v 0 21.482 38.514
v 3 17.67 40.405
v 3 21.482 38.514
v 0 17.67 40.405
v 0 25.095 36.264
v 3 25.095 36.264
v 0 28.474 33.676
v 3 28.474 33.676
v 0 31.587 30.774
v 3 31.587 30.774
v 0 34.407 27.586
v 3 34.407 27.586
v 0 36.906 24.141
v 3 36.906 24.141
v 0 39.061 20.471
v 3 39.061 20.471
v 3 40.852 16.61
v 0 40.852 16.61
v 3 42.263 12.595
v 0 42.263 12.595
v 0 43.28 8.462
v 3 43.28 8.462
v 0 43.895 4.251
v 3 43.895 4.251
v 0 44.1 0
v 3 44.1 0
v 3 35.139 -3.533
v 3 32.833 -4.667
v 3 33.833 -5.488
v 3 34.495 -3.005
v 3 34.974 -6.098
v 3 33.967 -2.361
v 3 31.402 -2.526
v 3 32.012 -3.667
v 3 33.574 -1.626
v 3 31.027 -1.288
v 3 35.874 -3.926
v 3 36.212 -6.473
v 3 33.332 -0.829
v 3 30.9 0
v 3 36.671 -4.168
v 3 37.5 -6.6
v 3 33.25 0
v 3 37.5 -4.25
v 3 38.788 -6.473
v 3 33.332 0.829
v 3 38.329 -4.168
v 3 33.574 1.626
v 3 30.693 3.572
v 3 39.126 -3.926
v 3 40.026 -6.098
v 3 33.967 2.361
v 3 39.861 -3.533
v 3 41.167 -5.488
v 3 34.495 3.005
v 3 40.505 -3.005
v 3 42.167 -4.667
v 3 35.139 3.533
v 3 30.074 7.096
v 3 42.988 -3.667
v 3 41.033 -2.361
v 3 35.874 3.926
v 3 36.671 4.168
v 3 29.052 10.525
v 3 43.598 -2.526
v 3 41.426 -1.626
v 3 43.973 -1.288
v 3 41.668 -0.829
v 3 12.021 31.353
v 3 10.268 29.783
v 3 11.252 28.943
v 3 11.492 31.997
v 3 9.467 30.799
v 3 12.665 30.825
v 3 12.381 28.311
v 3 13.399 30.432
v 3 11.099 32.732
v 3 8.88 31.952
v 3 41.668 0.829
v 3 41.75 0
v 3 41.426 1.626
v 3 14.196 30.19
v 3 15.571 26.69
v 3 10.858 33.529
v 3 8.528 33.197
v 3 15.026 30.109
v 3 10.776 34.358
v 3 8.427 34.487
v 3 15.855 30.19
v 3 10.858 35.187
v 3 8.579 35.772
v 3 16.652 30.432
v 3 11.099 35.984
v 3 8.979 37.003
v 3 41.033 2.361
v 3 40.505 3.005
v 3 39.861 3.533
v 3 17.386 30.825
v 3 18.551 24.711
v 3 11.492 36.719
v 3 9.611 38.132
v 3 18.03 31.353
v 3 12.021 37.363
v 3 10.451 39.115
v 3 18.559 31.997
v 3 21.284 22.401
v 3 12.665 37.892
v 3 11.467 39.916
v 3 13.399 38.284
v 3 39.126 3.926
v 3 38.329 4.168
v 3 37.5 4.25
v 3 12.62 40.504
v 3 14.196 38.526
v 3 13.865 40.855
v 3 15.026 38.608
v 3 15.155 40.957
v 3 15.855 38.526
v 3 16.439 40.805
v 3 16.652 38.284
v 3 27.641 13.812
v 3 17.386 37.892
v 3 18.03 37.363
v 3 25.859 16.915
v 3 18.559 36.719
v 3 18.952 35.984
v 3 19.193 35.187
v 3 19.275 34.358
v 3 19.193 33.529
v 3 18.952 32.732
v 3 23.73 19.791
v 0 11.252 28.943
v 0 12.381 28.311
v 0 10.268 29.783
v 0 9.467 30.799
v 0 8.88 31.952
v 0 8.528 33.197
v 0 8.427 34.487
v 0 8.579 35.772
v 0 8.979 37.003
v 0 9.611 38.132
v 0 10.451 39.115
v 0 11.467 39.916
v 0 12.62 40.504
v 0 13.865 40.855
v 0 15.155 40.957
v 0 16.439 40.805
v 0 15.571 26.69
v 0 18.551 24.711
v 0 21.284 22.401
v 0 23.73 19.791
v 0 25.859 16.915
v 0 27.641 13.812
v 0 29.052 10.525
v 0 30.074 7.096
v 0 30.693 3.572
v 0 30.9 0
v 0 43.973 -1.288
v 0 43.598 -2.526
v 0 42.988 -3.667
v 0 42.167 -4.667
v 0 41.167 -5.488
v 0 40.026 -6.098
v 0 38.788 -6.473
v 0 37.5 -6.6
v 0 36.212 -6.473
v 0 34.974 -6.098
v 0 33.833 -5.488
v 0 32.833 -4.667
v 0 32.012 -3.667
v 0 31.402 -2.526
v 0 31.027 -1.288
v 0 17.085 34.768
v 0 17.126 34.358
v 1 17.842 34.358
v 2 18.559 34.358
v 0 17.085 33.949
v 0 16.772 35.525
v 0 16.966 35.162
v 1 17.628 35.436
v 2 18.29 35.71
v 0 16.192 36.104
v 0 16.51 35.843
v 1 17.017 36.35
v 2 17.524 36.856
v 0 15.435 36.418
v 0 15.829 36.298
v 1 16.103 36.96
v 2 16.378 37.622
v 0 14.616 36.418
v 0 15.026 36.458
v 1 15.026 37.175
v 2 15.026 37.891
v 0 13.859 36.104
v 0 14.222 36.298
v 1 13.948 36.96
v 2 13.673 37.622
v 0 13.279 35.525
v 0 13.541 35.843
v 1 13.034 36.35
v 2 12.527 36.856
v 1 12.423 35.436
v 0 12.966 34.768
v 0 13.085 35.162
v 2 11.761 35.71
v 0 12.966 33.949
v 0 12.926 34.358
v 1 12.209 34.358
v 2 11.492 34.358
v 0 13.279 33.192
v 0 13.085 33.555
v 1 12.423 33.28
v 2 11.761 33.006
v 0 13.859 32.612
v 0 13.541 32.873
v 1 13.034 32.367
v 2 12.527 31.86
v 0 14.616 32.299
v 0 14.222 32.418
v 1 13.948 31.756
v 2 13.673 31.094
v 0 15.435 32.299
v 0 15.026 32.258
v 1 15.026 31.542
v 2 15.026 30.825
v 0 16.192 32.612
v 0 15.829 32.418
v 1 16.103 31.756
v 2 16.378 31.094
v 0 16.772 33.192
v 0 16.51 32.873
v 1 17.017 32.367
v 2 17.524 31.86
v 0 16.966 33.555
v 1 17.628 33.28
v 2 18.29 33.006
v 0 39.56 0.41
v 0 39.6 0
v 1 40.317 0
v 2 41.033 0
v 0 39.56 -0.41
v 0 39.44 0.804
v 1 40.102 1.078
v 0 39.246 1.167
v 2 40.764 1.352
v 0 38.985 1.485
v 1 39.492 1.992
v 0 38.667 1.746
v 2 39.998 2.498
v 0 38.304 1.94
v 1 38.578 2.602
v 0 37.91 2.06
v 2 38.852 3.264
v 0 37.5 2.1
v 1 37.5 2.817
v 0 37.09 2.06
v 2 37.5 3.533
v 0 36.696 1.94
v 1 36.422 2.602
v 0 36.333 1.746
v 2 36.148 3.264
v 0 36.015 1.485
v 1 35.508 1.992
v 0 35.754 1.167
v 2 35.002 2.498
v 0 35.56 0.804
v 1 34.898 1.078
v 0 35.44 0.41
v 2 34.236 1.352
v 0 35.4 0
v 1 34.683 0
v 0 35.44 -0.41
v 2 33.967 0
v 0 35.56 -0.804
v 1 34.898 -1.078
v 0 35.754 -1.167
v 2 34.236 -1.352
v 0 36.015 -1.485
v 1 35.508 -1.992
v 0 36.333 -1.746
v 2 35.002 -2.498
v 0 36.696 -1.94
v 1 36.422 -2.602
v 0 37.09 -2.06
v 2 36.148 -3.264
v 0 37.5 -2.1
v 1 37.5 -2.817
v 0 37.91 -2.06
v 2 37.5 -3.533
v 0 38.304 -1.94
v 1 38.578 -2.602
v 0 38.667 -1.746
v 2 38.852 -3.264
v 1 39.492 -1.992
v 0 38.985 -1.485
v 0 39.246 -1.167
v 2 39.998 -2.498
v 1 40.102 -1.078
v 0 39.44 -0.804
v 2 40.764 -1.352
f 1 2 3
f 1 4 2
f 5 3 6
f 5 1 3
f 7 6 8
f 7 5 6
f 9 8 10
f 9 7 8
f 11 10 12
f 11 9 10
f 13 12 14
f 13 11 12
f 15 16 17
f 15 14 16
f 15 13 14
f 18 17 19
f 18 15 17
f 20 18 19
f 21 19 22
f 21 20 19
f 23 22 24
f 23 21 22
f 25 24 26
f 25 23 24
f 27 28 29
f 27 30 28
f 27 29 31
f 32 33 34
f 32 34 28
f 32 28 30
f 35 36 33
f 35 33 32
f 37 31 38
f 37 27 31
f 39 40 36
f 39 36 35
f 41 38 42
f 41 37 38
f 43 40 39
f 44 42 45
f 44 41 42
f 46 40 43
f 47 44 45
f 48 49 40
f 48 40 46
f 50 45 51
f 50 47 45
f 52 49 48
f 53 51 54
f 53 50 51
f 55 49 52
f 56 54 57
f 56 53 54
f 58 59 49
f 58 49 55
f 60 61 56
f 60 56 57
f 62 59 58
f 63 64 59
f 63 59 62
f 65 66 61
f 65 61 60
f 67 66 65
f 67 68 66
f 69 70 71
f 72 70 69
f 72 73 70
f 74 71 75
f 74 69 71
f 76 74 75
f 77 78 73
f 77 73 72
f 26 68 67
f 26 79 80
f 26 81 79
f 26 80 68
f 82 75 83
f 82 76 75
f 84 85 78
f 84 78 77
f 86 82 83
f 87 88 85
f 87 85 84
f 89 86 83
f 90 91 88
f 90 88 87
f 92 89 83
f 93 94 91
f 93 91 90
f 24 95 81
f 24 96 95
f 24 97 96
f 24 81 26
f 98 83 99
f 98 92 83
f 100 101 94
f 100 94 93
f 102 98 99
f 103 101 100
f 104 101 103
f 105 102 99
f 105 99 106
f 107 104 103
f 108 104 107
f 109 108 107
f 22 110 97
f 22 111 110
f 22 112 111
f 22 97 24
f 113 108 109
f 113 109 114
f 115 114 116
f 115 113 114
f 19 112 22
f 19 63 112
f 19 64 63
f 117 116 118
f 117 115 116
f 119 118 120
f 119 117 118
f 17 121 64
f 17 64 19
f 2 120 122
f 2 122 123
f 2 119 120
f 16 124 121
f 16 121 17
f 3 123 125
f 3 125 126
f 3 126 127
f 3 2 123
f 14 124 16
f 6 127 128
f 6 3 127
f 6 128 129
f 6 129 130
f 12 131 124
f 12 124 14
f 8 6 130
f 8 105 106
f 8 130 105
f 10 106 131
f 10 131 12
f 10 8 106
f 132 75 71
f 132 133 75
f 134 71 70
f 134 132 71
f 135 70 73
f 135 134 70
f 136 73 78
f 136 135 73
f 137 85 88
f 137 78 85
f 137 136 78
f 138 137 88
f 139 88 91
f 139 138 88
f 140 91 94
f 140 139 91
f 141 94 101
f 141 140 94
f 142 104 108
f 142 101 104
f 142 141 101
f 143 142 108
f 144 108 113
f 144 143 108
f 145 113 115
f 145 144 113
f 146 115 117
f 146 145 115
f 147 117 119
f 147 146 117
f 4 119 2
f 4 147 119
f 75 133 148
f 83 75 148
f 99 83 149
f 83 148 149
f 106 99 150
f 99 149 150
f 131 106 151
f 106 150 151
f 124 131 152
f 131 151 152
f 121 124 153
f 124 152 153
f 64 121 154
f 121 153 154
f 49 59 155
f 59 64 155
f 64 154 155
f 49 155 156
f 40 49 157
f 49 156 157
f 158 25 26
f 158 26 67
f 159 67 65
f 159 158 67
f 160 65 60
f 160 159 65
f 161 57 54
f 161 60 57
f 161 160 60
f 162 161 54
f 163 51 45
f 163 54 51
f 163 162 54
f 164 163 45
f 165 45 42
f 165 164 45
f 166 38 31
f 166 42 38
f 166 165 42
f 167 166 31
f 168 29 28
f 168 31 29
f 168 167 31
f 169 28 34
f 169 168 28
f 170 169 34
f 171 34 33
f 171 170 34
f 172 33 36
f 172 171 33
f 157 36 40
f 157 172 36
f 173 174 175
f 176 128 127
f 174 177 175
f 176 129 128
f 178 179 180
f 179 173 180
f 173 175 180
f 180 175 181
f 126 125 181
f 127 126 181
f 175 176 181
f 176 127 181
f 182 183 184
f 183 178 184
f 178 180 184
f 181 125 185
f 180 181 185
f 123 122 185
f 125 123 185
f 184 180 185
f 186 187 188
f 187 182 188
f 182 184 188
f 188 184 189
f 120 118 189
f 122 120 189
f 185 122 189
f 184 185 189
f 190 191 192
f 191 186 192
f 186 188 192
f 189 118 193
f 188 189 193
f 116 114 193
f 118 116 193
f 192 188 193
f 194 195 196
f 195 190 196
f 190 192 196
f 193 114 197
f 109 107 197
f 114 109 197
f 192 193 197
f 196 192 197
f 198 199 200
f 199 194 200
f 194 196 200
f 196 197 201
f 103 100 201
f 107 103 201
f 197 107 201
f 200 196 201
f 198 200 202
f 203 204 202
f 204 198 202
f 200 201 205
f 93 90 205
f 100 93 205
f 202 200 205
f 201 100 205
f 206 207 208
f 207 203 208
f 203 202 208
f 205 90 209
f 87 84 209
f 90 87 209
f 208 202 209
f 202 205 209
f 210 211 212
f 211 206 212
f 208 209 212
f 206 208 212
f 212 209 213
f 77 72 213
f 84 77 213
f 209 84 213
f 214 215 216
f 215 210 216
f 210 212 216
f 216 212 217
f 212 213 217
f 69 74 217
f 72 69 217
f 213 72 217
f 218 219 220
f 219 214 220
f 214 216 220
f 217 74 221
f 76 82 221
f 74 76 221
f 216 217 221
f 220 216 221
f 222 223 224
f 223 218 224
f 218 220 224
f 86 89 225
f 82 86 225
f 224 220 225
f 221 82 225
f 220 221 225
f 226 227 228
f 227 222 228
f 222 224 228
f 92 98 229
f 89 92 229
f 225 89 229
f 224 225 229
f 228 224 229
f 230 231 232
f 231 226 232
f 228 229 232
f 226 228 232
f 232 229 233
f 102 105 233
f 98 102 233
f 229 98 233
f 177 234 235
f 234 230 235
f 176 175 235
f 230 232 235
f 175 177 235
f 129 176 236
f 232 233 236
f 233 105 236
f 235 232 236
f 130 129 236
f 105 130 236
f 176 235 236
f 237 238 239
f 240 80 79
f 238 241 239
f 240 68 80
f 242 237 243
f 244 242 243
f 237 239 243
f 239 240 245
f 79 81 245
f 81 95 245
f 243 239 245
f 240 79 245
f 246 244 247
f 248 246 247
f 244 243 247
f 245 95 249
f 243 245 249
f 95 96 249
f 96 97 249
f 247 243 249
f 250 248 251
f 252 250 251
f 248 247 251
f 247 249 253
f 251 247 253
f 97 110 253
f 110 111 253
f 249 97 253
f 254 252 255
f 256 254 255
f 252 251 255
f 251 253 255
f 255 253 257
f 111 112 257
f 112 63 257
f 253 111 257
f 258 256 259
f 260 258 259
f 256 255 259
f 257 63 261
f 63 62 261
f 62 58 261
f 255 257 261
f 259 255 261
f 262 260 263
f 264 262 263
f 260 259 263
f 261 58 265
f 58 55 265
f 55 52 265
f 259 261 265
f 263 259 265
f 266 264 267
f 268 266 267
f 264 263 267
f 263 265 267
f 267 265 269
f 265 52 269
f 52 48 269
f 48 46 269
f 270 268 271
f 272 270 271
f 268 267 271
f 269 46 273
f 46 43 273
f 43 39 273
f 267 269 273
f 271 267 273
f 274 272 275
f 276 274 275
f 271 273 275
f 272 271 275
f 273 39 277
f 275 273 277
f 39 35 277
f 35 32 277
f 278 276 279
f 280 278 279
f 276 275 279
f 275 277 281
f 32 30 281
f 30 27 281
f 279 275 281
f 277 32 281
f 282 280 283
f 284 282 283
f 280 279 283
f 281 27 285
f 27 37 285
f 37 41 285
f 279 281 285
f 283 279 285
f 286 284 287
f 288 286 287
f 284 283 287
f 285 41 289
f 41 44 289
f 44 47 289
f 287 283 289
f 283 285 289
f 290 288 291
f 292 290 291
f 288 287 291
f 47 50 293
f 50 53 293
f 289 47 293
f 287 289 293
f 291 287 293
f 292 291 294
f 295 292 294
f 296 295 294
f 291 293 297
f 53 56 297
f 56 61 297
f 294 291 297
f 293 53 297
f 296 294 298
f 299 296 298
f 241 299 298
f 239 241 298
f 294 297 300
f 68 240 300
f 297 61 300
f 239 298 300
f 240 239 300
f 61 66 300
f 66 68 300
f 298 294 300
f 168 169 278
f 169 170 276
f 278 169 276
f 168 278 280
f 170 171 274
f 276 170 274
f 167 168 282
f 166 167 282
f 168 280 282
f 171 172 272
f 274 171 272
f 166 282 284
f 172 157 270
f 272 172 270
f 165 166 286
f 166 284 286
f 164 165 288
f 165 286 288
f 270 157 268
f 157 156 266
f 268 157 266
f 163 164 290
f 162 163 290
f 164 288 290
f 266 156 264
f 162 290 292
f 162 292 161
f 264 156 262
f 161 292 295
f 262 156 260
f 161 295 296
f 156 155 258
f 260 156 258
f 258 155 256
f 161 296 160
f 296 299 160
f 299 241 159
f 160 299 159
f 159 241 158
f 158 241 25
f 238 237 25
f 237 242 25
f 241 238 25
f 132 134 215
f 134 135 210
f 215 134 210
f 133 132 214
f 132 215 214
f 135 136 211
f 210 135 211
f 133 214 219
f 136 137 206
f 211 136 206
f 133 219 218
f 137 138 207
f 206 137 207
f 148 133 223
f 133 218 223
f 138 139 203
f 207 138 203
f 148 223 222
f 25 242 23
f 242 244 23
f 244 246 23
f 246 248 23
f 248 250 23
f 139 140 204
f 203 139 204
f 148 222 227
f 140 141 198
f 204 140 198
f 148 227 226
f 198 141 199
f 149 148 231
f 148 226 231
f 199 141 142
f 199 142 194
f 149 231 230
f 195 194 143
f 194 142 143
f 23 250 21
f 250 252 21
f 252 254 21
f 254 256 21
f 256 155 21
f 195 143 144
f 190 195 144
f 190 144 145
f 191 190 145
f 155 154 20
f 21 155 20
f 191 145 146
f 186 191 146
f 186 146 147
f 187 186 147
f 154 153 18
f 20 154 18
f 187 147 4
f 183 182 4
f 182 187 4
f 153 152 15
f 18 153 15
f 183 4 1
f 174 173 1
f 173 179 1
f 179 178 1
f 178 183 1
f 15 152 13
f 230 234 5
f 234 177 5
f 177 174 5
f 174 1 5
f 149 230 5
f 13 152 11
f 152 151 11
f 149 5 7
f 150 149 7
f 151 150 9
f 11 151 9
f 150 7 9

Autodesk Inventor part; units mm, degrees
ref_plane "YZ Plane" through (0, 0, 0) normal (1, 0, 0) x (0, 1, 0)
ref_plane "XZ Plane" through (0, 0, 0) normal (0, 1, 0) x (-1, 0, 0)
ref_plane "XY Plane" through (0, 0, 0) normal (0, 0, 1) x (1, 0, 0)
sketch "Sketch1" plane through (0, 0, 0) normal (1, 0, 0) x (0, 1, 0)
  arc A0 (30.9, 0) -> (12.381, 28.3112) centre (0, 0) ccw
  arc A1 (44.1, 0) -> (17.6699, 40.4052) centre (0, 0) ccw
  line L0 (12.381, 28.3112) -> (17.6699, 40.4052)
  line L1 (30.9, 0) -> (44.1, 0) construction
  arc A2 (17.6699, 40.4052) -> (12.381, 28.3112) centre (15.0255, 34.3582) ccw
  arc A3 (30.9, 0) -> (44.1, 0) centre (37.5, 0) ccw
  circle A4 centre (15.0255, 34.3582) radius 2.1
  circle A5 centre (37.5, 0) radius 2.1
  dimension "d0" = 61.8
  dimension "d1" = 88.2
  dimension "d2" = 66.379
  dimension "d3" = 4.2
  dimension "d4" = 4.2
extrude "Extrusion1" add sketch "Sketch1" along normal blind 3 contours A0 L0 A4 A1 A3 | A2 L0 A4
chamfer "Chamfer1" distance 2.15 distance2 3 2 edges at (3, 12.9255, 34.3582) (3, 35.4, 0) measured on face at (3, 38.069, 10.7229)
properties part number "Mechanische_Anschlaege_Clip"
